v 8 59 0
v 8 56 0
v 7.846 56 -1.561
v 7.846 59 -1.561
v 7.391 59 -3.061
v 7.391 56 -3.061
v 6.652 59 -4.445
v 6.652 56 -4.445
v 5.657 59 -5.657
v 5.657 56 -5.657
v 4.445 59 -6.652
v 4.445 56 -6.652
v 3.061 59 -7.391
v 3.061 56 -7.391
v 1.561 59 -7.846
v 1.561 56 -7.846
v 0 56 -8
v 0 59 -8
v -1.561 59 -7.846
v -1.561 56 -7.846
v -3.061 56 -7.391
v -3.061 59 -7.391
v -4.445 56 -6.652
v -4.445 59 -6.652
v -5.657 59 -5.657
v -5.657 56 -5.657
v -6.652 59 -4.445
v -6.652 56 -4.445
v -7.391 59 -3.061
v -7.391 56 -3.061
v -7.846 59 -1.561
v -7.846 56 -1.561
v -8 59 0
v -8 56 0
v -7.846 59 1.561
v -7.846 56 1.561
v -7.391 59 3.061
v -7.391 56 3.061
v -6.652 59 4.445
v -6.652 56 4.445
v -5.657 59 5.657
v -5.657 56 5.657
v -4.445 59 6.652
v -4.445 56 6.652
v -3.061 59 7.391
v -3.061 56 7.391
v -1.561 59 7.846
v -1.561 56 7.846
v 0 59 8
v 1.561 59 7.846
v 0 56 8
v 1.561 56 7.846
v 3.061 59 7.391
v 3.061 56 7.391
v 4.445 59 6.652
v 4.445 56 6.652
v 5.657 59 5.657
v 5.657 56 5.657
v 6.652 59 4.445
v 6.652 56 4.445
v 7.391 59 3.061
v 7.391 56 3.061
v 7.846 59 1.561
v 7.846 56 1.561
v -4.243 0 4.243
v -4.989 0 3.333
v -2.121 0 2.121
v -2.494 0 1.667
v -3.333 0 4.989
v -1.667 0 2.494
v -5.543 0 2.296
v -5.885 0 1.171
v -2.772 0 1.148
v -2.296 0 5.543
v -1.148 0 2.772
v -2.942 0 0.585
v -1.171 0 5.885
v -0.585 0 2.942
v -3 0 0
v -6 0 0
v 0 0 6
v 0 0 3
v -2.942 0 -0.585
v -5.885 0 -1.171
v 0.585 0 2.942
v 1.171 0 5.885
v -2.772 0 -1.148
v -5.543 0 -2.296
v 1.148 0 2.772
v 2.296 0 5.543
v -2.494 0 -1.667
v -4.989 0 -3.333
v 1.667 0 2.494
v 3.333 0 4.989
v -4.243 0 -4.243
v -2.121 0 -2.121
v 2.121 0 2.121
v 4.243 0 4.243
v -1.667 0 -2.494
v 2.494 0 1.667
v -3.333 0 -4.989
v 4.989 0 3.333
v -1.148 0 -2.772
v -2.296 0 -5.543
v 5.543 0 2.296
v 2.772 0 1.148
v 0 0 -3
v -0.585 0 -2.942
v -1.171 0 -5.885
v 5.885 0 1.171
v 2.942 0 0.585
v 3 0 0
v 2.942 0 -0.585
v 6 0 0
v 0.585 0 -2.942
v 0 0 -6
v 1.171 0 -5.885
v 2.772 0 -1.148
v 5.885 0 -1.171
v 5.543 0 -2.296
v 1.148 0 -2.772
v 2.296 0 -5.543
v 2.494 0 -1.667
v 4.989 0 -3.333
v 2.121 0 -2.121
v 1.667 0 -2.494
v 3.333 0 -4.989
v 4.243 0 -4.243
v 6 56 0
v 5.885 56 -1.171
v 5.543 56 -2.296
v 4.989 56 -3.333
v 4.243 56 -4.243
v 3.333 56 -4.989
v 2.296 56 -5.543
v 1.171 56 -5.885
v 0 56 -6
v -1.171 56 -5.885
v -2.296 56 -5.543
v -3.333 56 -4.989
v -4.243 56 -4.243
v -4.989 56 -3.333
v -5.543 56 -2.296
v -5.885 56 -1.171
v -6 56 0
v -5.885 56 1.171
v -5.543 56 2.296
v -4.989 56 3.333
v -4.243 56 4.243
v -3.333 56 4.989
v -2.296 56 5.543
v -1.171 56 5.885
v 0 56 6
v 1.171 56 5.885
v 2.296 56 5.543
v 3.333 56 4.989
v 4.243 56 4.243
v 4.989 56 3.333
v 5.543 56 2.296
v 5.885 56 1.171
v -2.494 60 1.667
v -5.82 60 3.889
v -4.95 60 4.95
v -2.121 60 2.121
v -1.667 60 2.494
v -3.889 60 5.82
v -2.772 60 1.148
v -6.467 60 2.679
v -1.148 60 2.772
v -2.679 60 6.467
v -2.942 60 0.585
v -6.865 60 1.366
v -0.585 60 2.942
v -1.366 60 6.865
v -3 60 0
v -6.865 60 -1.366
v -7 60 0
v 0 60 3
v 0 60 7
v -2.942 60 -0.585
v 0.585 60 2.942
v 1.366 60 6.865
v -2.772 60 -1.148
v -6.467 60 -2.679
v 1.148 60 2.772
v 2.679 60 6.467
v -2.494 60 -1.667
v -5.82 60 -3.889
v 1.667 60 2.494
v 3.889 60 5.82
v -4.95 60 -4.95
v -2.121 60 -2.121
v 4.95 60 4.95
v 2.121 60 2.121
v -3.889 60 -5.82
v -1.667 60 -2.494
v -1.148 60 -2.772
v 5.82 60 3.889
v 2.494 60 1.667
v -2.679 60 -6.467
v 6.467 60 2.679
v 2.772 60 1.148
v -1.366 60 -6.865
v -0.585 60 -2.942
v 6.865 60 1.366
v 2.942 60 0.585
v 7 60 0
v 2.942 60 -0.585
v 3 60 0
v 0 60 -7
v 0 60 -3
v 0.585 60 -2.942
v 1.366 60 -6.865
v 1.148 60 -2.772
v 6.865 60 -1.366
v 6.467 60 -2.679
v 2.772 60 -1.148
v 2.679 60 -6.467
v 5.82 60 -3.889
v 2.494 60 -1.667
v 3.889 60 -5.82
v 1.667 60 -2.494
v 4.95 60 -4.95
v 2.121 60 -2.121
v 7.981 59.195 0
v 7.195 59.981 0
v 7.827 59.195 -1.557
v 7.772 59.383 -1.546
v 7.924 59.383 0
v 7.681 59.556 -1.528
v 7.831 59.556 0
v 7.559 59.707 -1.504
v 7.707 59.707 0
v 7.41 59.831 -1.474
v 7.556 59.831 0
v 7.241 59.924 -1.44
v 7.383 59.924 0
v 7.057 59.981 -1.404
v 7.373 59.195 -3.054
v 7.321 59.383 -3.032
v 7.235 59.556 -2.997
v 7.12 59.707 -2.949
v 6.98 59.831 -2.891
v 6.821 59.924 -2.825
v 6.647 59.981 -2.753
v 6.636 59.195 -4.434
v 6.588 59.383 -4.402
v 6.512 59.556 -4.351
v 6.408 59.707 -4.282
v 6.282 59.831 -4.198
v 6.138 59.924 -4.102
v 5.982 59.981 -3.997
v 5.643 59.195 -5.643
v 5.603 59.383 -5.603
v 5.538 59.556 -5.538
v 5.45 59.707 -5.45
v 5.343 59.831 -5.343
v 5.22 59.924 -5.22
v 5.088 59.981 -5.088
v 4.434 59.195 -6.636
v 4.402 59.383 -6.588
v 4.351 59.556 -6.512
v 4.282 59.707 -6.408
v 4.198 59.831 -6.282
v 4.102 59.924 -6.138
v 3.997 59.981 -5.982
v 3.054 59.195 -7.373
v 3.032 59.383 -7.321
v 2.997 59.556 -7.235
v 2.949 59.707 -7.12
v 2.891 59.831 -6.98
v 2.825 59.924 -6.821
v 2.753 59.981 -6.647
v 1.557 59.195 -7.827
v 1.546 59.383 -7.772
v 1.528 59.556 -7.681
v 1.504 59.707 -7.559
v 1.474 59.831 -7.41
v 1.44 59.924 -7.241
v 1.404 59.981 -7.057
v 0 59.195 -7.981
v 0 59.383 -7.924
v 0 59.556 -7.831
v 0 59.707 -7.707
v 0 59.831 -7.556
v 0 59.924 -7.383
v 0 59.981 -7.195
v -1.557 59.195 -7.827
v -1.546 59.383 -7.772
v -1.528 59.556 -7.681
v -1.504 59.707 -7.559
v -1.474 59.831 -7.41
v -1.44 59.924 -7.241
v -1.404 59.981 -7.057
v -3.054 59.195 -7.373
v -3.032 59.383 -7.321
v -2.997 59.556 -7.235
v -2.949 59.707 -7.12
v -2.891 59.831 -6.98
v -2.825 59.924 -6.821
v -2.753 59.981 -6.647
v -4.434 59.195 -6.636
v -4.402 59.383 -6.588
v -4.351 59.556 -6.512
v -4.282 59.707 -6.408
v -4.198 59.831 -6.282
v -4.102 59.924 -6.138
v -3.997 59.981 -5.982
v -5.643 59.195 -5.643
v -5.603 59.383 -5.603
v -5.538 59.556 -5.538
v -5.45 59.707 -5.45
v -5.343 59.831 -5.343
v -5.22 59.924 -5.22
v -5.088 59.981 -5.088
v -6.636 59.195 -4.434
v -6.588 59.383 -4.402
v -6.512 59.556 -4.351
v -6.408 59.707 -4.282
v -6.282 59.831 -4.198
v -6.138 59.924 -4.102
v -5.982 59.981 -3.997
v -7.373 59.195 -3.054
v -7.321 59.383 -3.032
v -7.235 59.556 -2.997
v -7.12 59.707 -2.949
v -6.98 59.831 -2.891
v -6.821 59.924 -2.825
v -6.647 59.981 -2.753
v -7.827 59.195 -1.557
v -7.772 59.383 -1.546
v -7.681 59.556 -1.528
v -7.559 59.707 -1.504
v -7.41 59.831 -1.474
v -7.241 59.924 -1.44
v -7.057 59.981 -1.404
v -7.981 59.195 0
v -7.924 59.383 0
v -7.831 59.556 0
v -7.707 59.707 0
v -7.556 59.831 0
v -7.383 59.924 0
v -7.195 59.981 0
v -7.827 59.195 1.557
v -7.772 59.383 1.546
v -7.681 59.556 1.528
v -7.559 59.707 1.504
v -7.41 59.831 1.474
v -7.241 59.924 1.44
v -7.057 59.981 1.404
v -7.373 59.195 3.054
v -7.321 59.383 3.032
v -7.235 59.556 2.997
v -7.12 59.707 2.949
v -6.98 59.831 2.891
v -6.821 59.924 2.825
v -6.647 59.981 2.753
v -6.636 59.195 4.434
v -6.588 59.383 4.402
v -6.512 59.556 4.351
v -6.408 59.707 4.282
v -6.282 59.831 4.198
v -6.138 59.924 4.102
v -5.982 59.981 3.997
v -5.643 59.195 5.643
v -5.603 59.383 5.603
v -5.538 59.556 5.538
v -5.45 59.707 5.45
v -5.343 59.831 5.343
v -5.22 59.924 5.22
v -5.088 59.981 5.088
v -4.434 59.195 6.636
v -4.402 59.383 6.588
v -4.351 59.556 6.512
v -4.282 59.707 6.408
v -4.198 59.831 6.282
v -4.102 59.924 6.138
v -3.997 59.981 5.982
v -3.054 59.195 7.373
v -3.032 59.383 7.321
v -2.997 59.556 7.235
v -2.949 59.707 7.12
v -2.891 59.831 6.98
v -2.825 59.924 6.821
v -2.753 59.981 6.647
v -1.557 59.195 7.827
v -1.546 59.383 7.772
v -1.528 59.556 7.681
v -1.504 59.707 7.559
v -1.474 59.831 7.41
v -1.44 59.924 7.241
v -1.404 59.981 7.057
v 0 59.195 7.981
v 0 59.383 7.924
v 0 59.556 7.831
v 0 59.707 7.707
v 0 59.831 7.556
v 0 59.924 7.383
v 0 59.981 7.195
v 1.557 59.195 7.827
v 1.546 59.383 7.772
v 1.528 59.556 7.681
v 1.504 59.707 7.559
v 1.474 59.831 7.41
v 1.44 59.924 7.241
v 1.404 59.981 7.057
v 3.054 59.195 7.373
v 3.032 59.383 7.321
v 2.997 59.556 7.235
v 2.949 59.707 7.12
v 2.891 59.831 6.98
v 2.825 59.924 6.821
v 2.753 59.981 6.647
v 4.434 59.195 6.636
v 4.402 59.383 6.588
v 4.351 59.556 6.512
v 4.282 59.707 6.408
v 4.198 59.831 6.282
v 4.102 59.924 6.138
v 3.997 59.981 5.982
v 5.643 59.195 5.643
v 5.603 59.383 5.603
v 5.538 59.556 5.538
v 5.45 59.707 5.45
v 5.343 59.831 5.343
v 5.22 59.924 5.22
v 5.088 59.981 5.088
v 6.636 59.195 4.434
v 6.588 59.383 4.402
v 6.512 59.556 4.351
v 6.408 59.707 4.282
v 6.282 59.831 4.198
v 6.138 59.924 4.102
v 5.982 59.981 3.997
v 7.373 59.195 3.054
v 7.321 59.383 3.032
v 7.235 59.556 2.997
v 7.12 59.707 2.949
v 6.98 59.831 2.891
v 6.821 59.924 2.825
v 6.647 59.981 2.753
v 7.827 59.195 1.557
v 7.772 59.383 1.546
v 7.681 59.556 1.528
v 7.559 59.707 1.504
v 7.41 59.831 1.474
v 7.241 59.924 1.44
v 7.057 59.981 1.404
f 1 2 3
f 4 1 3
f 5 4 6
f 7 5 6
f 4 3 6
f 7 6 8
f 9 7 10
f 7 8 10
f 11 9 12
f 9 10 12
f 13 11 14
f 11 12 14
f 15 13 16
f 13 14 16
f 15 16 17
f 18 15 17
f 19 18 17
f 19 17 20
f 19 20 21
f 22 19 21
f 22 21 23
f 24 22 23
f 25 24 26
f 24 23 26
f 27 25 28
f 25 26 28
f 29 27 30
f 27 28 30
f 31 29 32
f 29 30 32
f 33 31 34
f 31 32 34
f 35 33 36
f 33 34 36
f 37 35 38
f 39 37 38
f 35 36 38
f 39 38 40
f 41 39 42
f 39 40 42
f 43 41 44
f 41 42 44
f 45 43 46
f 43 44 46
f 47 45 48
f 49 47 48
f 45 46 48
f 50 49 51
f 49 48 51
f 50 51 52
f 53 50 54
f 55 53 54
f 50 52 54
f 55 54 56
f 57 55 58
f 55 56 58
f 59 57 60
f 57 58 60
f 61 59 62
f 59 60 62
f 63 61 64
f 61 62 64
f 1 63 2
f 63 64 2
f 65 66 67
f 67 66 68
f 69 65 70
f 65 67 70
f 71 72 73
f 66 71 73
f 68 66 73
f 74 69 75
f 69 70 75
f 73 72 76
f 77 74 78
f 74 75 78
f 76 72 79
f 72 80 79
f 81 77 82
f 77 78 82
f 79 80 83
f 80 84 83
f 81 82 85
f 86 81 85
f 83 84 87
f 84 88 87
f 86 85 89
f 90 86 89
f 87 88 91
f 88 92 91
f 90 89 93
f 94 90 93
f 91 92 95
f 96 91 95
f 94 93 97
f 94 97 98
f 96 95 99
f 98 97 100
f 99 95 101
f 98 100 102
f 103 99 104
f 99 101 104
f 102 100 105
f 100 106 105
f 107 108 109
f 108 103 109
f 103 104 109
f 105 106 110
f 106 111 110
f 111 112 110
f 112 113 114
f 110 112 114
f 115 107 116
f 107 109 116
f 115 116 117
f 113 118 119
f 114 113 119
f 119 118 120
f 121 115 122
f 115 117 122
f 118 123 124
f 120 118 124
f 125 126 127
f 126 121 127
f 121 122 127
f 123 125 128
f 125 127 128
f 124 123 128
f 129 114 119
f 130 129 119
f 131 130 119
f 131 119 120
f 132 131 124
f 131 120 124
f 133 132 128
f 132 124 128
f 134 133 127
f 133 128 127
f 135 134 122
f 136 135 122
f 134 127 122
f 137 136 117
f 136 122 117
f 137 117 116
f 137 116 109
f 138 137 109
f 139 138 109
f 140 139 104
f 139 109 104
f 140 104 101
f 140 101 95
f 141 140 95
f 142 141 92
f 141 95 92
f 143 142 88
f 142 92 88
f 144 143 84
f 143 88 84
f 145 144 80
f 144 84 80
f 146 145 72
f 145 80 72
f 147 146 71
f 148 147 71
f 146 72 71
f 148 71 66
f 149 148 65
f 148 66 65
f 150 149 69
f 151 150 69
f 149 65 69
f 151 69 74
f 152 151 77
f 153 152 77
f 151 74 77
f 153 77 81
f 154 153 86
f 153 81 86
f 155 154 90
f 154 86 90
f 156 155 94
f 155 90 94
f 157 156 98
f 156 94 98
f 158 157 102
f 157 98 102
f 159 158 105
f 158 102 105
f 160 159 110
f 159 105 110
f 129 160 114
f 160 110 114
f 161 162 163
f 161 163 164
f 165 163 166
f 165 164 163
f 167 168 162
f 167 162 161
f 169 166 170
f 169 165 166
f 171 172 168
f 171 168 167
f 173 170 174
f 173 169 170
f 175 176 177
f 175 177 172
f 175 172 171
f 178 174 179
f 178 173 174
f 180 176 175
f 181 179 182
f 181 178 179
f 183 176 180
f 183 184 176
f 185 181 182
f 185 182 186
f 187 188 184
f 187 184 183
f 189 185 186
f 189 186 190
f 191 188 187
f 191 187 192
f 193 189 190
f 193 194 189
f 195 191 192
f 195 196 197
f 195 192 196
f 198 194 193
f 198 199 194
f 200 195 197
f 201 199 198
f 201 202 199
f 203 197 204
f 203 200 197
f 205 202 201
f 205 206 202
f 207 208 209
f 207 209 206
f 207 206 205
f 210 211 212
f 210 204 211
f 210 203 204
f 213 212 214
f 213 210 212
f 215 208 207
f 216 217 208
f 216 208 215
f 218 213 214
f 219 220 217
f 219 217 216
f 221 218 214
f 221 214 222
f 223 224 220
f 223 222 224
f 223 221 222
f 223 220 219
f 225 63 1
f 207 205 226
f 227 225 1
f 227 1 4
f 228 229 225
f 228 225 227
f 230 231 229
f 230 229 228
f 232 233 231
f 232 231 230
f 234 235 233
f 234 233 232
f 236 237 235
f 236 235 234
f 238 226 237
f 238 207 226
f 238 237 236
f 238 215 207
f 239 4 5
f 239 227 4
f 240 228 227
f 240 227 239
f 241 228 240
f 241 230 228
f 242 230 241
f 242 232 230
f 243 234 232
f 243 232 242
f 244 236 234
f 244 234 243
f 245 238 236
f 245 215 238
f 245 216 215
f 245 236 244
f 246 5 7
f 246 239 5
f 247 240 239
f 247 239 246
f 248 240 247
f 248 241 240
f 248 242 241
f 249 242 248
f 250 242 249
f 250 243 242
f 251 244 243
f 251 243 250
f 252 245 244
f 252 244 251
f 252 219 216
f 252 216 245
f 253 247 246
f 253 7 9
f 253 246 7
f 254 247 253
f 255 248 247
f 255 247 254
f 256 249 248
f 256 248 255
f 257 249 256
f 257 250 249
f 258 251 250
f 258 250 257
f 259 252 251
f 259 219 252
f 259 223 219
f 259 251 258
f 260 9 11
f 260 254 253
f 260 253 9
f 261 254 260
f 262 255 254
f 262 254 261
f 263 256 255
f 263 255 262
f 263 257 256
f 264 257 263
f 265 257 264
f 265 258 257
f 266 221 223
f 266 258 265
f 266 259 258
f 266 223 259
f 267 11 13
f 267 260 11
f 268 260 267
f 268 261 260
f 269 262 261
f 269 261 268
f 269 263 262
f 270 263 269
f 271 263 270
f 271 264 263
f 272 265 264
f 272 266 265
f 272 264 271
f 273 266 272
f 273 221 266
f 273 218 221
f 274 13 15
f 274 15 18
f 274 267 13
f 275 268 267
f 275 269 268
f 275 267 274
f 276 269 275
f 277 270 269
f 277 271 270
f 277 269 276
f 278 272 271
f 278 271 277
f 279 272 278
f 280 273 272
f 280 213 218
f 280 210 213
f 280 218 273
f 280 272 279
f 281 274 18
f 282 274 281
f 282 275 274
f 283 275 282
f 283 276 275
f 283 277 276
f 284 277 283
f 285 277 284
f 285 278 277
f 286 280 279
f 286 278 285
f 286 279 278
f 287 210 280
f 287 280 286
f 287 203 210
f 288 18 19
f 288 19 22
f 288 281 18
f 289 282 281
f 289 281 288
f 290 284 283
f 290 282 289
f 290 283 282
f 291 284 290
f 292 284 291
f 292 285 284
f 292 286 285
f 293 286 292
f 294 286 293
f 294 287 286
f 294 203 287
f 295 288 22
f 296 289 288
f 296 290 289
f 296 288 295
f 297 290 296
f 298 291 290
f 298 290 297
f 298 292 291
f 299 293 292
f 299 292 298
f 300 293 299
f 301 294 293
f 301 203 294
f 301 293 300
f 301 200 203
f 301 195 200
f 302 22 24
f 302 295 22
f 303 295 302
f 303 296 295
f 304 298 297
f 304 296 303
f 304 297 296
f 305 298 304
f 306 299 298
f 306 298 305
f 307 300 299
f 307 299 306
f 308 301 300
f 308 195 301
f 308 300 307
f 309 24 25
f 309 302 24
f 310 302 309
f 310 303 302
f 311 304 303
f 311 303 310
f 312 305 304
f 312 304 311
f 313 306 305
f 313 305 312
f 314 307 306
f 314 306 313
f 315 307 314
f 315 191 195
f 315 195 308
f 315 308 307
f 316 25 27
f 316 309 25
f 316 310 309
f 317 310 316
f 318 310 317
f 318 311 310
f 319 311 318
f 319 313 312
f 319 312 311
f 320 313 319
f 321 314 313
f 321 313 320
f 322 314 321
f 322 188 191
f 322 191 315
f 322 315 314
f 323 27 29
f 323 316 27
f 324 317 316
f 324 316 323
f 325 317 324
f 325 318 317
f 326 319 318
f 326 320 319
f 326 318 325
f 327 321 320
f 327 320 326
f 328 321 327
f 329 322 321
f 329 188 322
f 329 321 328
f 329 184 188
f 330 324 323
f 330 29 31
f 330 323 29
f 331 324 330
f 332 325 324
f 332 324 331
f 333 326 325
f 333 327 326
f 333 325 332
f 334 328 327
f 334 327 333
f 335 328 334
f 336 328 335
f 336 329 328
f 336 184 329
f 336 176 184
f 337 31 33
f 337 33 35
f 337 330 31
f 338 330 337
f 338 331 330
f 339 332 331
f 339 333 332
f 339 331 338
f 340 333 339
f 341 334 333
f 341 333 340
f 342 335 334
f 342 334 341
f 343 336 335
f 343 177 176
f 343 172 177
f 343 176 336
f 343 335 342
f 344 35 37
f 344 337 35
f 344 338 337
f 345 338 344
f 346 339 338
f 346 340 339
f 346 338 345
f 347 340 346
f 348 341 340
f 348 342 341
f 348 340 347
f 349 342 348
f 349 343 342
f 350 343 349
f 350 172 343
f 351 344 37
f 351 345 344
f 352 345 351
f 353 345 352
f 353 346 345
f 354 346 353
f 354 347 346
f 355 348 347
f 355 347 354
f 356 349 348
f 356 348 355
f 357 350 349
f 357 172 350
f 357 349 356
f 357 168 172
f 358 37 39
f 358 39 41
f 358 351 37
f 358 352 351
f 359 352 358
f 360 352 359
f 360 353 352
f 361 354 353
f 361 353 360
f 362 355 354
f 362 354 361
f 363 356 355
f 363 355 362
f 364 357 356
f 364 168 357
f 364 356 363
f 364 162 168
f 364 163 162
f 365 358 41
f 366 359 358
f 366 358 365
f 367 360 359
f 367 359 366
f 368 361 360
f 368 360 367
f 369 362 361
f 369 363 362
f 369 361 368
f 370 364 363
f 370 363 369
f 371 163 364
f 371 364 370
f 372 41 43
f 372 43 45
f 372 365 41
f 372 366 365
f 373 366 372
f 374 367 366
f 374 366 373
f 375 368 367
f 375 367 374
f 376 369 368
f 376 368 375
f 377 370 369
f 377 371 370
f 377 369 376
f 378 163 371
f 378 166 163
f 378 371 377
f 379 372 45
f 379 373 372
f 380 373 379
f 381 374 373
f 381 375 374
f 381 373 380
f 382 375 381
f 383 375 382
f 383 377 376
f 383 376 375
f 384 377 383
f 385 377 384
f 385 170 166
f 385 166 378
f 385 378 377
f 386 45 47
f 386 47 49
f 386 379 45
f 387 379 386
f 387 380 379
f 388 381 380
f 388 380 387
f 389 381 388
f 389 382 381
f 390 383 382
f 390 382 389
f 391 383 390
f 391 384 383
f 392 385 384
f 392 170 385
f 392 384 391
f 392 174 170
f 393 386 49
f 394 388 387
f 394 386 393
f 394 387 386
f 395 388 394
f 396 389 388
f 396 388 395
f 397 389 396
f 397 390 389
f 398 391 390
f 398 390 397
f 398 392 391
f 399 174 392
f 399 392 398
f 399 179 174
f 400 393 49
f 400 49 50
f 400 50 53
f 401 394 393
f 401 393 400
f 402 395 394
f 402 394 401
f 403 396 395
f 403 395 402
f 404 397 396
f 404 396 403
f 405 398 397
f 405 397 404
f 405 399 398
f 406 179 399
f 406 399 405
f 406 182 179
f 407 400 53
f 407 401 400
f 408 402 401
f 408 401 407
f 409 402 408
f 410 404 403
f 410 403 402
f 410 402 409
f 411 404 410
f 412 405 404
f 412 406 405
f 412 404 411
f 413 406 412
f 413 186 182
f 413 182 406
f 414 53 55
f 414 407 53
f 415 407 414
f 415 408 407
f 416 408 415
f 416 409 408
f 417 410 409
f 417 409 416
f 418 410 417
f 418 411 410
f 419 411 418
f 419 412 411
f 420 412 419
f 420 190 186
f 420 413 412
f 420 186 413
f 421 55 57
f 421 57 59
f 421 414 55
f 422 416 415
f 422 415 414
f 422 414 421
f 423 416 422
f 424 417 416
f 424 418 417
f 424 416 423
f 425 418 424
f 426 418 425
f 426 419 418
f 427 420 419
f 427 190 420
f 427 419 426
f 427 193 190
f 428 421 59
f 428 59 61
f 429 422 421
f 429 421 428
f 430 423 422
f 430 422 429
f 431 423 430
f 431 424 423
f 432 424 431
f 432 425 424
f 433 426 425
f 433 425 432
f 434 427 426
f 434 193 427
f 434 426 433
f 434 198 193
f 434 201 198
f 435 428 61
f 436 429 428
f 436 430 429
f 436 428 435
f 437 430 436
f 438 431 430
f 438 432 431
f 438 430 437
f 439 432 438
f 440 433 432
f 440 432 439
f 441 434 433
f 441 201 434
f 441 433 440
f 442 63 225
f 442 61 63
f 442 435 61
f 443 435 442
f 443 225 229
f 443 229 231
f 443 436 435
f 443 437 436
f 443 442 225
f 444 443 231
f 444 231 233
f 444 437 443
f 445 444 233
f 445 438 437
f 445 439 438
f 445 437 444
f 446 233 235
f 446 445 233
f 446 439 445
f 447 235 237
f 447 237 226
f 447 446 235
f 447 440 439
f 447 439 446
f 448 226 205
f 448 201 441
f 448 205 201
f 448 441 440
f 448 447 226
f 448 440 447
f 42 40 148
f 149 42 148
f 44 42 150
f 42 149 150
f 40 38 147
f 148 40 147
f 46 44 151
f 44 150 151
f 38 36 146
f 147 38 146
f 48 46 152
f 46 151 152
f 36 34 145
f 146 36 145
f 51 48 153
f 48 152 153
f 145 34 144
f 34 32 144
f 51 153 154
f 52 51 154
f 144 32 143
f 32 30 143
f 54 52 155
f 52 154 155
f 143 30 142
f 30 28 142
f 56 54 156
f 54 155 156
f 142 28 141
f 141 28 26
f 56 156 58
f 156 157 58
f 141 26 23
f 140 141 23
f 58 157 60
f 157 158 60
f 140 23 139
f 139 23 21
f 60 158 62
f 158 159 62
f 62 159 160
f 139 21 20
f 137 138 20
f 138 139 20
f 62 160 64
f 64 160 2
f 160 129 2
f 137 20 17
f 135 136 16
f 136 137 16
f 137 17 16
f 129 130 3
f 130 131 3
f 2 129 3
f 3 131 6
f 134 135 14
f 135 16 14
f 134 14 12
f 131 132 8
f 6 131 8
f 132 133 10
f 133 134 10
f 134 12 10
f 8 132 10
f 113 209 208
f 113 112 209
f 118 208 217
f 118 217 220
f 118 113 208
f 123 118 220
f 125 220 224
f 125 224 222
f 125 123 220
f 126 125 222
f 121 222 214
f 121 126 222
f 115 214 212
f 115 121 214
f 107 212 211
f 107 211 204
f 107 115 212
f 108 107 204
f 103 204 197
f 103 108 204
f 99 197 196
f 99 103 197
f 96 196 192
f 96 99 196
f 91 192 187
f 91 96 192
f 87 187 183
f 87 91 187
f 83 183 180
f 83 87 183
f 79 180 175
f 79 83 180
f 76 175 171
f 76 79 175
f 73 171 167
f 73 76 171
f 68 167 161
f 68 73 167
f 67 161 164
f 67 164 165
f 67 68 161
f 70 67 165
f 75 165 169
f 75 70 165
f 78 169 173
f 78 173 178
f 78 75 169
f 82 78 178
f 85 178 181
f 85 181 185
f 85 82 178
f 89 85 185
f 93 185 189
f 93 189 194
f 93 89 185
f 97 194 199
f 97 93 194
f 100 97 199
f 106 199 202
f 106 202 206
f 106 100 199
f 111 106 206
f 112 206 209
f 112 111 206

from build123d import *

# Parameters (mm, degrees)
SCHIZZO1_R                   = 6
SCHIZZO1_R_2                 = 3
ESTRUSIONE_ESTRUSIONE1_DEPTH = 56
SCHIZZO2_R                   = 8
SCHIZZO2_R_2                 = 3
ESTRUSIONE_ESTRUSIONE2_DEPTH = 4
RACCORDO1_R                  = 1


with BuildPart() as part:
    # Schizzo1 → Estrusione-Estrusione1 (new body)
    with BuildSketch(Plane(origin=(0, 0, 0), x_dir=(1, 0, 0), z_dir=(0, 1, 0))):
        Circle(SCHIZZO1_R)
        Circle(SCHIZZO1_R_2, mode=Mode.SUBTRACT)
    extrude(amount=ESTRUSIONE_ESTRUSIONE1_DEPTH)

    # Schizzo2 → Estrusione-Estrusione2 (add)
    with BuildSketch(Plane(origin=(0, 56, 0), x_dir=(1, 0, 0), z_dir=(0, 1, 0))):
        Circle(SCHIZZO2_R)
        Circle(SCHIZZO2_R_2, mode=Mode.SUBTRACT)
    extrude(amount=ESTRUSIONE_ESTRUSIONE2_DEPTH)

    # Raccordo1
    raccordo1_edges = [part.edges().sort_by_distance(p)[0] for p in [
        (-8, 60, 0),
    ]]
    fillet(raccordo1_edges, radius=RACCORDO1_R)


solid = part.part
